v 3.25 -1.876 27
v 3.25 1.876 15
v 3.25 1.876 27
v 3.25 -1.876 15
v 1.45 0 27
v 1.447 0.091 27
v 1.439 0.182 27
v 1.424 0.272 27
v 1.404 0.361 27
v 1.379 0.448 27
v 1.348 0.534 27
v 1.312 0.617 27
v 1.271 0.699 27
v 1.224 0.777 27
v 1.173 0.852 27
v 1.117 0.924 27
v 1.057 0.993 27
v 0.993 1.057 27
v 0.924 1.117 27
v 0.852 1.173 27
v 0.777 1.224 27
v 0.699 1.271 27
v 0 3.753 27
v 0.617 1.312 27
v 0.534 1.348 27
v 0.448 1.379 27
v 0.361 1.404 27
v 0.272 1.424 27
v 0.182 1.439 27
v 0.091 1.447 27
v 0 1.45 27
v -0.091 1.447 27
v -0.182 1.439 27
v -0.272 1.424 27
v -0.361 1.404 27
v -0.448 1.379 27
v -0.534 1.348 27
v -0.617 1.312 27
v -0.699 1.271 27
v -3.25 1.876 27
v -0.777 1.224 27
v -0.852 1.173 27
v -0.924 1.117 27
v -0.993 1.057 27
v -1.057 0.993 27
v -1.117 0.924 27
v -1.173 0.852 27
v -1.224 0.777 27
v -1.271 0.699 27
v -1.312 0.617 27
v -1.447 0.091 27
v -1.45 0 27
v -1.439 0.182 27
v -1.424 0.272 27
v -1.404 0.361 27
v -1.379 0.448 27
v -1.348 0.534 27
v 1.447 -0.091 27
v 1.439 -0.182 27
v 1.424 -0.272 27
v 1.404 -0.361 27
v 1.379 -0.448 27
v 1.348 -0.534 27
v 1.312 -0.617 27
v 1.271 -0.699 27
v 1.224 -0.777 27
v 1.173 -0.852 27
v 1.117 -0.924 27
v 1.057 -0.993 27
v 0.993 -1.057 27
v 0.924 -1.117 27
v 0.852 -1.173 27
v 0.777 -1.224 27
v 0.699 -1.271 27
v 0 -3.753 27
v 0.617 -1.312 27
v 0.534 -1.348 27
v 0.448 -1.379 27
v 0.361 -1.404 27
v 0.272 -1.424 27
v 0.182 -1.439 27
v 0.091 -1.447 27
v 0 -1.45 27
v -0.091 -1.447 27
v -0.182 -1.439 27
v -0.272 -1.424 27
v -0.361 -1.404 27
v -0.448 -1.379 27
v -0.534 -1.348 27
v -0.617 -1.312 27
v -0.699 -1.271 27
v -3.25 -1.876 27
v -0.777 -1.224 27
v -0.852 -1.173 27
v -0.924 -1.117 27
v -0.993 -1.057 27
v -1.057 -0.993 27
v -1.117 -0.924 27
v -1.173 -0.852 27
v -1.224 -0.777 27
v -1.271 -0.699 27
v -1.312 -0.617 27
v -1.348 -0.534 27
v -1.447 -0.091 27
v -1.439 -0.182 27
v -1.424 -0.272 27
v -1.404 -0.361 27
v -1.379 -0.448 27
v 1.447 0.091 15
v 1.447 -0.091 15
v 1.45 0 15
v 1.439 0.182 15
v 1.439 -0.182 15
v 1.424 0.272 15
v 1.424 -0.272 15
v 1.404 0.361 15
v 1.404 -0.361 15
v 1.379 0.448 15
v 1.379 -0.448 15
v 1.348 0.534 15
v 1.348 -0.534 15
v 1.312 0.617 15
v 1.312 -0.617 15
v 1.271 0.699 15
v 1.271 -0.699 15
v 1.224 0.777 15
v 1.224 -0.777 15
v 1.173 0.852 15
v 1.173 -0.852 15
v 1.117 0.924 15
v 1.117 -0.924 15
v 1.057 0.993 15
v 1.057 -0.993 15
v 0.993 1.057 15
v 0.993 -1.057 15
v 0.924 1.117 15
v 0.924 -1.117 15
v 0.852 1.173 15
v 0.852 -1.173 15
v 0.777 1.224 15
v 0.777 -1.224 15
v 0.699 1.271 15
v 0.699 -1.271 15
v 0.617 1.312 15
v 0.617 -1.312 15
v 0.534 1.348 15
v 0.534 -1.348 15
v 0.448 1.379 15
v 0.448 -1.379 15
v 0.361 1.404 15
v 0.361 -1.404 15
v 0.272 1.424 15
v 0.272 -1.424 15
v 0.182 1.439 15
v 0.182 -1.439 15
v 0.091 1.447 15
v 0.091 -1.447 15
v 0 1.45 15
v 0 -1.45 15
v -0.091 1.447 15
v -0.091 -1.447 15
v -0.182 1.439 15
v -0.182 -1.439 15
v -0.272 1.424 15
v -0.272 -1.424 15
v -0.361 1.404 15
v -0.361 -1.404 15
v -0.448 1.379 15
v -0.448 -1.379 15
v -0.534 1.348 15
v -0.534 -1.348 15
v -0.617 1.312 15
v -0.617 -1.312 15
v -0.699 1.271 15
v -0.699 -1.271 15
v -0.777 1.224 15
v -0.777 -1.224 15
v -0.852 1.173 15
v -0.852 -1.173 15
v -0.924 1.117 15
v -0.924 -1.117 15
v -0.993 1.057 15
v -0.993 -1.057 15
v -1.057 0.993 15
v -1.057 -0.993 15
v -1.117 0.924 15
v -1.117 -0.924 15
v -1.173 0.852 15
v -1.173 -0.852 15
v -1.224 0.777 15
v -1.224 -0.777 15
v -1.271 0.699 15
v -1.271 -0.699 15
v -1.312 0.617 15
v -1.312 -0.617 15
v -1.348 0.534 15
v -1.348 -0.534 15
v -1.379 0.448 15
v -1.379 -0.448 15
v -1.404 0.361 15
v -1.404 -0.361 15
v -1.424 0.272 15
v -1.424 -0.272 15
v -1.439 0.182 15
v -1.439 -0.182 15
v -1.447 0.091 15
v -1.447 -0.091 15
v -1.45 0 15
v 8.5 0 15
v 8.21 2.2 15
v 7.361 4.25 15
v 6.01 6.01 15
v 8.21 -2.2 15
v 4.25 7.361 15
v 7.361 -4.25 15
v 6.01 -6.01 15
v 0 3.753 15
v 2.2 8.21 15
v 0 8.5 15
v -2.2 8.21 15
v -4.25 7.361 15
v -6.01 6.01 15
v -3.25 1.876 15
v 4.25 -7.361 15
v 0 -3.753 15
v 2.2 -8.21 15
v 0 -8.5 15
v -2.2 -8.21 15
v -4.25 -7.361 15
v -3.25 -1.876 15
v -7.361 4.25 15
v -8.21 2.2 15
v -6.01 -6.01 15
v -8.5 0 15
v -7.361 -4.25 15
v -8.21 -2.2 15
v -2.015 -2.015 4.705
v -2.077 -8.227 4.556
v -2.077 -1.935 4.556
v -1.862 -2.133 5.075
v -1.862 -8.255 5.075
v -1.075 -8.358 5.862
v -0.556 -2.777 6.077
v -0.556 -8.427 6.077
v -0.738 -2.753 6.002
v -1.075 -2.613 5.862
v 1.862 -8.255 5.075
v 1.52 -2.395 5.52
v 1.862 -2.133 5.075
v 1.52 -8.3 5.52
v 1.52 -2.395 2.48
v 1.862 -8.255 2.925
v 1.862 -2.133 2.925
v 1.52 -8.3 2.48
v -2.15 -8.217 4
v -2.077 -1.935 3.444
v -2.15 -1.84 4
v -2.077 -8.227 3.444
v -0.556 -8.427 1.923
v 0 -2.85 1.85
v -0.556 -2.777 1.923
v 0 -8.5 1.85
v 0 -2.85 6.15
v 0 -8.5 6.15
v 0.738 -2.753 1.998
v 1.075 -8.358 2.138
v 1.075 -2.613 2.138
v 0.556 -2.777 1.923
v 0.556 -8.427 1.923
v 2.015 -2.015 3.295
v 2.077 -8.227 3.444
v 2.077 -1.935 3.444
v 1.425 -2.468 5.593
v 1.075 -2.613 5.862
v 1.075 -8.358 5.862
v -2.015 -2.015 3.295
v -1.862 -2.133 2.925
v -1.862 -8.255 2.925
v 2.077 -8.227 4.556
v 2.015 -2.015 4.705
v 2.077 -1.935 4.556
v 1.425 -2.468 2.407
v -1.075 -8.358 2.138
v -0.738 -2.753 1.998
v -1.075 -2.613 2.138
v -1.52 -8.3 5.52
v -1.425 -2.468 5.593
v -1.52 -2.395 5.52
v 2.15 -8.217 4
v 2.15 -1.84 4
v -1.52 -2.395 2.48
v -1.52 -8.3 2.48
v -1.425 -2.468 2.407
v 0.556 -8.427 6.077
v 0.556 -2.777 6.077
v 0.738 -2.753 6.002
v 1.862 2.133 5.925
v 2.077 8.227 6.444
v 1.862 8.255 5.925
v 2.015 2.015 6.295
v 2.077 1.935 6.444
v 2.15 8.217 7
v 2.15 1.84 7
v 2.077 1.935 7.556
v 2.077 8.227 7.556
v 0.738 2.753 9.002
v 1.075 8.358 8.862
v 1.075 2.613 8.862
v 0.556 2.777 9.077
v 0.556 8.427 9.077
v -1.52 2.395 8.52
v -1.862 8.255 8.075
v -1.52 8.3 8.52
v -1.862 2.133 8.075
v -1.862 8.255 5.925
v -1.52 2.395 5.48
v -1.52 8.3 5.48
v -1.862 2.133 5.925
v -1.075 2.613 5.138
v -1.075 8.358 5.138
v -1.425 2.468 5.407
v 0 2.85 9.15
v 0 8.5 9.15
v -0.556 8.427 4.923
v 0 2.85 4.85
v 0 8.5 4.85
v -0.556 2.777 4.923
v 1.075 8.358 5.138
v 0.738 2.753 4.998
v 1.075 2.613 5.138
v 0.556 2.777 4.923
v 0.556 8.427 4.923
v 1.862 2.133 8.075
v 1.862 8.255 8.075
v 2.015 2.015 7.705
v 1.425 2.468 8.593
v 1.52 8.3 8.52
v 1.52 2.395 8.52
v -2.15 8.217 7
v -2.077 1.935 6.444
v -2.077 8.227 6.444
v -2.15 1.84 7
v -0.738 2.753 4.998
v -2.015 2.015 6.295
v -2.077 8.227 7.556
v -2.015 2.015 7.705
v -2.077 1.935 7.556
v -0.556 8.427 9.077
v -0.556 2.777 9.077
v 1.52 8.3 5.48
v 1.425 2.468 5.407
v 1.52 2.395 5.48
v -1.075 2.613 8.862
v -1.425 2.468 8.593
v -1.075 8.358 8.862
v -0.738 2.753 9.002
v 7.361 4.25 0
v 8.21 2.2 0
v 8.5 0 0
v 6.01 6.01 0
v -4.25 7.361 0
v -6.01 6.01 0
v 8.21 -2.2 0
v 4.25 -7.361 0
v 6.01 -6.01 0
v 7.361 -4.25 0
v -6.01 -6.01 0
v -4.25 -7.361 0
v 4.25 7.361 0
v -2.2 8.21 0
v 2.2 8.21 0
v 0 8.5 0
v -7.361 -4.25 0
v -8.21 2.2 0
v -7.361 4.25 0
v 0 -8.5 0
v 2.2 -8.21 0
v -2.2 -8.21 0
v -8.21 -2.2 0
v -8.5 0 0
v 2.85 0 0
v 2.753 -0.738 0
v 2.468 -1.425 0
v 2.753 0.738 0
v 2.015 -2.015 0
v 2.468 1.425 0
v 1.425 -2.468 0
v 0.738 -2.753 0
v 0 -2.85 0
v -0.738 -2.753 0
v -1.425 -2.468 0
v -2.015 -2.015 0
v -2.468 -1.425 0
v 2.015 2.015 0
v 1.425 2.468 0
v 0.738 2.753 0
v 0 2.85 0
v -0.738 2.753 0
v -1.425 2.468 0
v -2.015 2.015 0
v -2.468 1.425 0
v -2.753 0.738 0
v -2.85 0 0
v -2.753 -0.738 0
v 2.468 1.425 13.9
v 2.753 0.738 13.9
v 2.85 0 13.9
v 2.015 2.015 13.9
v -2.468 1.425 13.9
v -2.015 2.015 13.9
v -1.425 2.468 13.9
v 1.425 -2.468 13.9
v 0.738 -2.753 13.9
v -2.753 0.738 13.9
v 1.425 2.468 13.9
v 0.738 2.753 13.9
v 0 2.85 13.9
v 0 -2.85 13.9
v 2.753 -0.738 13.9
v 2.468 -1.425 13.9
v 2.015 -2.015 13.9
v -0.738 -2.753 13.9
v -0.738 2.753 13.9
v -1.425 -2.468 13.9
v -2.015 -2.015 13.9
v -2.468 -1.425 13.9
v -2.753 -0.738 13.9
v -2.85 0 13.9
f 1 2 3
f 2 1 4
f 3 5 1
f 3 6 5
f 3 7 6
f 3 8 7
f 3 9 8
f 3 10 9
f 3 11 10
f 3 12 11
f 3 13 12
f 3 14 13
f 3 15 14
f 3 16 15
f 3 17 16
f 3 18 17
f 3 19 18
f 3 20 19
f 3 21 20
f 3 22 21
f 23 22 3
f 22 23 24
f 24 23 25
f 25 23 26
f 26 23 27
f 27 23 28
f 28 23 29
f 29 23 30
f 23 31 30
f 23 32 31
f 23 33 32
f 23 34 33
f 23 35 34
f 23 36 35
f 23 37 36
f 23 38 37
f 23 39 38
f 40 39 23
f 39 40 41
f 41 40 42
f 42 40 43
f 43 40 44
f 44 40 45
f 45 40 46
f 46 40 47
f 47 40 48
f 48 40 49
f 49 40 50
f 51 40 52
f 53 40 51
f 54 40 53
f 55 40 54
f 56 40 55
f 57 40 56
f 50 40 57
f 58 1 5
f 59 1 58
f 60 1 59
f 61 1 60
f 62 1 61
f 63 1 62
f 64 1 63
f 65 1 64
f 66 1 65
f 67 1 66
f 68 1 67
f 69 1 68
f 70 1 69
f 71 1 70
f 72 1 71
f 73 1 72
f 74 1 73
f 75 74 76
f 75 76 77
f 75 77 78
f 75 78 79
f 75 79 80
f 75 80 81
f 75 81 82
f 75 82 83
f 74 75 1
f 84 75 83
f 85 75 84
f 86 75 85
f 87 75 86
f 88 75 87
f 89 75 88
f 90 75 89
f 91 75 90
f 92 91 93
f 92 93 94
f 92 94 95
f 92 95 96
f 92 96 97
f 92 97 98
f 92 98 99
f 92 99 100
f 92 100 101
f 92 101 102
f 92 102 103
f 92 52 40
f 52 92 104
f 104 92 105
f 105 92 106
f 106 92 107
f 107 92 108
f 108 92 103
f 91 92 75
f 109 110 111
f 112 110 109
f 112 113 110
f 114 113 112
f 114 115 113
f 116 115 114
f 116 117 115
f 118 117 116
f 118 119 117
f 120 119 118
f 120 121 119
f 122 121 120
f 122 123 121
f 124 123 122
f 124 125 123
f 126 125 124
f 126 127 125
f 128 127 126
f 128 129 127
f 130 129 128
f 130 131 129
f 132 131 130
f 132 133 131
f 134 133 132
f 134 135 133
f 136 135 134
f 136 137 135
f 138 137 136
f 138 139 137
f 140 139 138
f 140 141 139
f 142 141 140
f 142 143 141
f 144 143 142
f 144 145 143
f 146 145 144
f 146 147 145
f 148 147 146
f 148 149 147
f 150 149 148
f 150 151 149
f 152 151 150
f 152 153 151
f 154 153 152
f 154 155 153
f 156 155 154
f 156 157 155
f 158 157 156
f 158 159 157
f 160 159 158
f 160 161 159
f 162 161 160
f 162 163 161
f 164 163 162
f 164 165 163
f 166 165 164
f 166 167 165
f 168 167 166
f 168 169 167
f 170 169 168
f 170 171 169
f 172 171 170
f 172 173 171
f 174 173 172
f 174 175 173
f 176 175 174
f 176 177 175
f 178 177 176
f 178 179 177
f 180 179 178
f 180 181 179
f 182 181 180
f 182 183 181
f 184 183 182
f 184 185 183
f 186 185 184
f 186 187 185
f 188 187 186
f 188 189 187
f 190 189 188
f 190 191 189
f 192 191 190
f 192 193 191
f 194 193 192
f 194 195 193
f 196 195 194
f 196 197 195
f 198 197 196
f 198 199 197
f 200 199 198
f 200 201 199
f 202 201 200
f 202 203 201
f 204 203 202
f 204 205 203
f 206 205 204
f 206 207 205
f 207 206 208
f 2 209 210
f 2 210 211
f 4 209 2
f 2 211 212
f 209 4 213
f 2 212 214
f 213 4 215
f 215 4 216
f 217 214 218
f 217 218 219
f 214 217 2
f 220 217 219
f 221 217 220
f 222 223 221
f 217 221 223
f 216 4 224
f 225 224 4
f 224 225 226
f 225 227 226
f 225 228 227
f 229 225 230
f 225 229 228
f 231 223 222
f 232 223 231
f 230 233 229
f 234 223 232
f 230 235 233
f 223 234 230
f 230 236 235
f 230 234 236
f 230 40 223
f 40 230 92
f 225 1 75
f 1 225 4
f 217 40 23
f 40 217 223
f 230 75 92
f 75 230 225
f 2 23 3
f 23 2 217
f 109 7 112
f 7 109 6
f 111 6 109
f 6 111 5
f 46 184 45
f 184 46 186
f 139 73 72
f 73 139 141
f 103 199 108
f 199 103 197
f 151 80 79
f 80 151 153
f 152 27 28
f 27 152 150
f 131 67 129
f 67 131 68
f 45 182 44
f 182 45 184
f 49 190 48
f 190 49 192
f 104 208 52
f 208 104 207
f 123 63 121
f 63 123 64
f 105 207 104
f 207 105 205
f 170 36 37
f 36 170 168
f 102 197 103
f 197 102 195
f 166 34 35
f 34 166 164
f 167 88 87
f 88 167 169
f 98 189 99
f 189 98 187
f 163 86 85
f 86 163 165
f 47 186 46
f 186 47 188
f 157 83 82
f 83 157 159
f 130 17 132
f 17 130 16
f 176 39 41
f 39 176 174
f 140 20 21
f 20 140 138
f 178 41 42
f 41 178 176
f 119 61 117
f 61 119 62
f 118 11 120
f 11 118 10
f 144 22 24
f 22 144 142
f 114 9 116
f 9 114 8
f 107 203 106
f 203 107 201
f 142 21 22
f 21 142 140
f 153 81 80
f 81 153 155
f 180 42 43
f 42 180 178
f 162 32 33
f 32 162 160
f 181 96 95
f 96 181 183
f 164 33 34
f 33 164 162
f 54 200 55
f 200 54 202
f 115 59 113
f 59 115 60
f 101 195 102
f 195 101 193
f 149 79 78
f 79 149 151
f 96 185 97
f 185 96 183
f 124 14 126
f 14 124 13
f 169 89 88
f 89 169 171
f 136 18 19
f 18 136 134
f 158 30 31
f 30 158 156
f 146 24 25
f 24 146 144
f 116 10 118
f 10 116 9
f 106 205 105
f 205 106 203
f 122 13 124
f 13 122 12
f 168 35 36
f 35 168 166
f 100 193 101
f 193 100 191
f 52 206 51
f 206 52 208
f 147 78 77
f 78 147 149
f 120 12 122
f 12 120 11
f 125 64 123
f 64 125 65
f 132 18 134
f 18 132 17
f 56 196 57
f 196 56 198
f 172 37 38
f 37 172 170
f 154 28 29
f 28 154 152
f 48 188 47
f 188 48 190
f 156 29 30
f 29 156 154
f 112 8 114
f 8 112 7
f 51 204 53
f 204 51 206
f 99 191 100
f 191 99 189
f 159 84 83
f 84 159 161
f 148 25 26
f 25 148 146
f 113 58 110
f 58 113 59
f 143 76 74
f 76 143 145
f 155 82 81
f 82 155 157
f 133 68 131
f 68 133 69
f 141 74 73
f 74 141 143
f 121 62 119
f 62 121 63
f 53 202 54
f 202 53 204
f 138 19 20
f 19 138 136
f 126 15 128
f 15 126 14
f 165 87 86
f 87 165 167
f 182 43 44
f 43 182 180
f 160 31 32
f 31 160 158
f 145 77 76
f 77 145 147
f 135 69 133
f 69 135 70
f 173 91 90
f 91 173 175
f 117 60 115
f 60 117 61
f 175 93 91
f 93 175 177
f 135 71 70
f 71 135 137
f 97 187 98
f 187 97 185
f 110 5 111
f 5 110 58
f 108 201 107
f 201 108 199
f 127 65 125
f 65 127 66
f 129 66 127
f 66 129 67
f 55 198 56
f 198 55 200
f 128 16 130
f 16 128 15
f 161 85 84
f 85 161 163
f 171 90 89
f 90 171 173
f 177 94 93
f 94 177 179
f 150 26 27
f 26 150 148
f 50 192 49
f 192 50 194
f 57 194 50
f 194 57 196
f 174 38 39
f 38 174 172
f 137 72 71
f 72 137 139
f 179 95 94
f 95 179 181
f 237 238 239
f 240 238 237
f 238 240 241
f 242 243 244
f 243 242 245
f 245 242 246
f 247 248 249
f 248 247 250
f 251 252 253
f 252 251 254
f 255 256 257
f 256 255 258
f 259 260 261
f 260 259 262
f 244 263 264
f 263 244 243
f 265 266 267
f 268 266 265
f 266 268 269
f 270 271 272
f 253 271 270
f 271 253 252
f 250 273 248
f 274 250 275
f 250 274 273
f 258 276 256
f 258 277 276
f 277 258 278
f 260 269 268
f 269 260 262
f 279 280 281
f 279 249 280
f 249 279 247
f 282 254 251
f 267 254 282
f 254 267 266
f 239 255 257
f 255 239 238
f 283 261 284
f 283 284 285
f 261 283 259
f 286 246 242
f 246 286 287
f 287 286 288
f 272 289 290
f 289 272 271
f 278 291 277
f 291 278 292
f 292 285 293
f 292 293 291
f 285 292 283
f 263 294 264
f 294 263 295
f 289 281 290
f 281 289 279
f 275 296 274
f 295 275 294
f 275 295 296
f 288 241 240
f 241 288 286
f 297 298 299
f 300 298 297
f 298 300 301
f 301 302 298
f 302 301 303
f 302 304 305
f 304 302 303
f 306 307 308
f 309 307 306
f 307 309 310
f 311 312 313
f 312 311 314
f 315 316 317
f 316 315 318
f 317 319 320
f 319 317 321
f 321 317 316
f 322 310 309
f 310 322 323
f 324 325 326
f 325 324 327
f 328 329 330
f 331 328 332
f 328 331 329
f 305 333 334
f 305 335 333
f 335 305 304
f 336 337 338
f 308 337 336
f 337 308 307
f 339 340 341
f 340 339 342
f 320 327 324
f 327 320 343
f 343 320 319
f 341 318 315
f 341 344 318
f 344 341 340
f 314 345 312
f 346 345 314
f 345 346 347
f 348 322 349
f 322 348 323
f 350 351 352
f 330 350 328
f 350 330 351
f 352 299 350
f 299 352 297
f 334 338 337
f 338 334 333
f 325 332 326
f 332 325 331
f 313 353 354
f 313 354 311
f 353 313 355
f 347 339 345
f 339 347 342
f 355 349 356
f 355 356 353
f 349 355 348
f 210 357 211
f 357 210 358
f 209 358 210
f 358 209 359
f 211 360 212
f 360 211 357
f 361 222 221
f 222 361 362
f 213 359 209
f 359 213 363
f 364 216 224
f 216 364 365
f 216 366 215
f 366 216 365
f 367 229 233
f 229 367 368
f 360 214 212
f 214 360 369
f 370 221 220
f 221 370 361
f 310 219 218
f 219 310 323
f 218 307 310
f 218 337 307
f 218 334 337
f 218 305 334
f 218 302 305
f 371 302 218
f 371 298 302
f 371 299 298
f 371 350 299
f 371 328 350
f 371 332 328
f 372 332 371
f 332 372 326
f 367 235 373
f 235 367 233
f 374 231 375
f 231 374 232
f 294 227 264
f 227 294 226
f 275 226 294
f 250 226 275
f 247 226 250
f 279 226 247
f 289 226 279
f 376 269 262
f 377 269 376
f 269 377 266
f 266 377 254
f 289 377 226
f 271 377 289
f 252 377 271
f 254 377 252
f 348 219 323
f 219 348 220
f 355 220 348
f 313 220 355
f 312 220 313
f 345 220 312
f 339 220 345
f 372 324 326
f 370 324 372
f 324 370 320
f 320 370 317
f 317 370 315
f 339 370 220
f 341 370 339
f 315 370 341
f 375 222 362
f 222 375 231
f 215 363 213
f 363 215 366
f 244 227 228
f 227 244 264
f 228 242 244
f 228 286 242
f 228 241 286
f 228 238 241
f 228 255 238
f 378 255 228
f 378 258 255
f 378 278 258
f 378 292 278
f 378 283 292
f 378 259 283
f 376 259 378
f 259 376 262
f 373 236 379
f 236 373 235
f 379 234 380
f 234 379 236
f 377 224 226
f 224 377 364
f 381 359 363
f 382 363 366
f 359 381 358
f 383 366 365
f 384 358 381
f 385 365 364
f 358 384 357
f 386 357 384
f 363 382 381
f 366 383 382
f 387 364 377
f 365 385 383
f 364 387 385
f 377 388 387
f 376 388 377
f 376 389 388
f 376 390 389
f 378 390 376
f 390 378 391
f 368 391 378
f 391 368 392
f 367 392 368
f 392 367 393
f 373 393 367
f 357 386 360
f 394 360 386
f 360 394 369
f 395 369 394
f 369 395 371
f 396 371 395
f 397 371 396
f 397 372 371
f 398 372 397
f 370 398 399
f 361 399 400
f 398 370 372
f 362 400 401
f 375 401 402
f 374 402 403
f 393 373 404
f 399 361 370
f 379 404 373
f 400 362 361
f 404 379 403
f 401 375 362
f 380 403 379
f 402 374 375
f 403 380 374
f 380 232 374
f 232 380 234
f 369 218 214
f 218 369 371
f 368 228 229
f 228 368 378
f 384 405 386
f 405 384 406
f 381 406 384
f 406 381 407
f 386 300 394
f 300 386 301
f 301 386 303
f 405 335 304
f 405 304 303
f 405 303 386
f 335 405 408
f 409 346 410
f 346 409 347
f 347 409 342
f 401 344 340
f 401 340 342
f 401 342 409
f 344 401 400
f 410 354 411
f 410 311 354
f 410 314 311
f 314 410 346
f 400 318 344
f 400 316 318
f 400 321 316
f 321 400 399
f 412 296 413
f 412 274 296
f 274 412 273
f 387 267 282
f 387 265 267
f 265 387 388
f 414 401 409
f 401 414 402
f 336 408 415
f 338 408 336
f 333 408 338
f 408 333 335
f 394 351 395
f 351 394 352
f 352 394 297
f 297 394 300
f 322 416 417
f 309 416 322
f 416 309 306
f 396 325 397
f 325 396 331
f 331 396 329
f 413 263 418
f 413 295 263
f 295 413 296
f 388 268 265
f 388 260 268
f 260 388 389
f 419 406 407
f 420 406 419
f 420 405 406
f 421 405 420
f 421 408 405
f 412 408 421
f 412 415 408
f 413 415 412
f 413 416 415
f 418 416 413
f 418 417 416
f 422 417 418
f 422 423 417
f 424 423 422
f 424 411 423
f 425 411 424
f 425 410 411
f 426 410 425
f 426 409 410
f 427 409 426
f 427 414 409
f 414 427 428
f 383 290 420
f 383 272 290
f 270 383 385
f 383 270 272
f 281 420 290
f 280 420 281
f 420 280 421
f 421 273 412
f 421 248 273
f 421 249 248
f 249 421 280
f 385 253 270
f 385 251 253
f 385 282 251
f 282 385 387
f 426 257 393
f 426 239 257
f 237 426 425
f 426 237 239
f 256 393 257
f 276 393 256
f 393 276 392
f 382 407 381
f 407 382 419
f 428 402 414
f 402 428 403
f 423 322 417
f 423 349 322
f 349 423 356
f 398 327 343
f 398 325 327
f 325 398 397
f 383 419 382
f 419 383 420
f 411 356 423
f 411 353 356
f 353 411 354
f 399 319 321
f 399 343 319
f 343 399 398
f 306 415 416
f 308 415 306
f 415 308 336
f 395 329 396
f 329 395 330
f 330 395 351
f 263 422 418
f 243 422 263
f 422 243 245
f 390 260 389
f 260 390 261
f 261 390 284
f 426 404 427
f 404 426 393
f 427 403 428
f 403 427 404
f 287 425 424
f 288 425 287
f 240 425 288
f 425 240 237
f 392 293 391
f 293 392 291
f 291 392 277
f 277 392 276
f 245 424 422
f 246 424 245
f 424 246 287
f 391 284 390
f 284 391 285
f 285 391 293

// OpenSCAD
/*
 * Module: project_12mm_hex_wheel_adaptors.scad
 * this generates an adaptor the connects standard RC wheel 12mm hex nut
 *   wheels to standard robotics motor hubs  
 *
 *   NOTE that hub adaptors should be printed slowly -- about 50% normal print speed 
 *
 * Author(s): Don Korte 
 *
 * github: https://github.com/dnkorte/
 *  
 * MIT License
 * 
 * Copyright (c) 2022 Don Korte
 * 
 * Permission is hereby granted, free of charge, to any person obtaining a copy
 * of this software and associated documentation files (the "Software"), to deal
 * in the Software without restriction, including without limitation the rights
 * to use, copy, modify, merge, publish, distribute, sublicense, and/or sell
 * copies of the Software, and to permit persons to whom the Software is
 * furnished to do so, subject to the following conditions:
 * 
 * The above copyright notice and this permission notice shall be included in all
 * copies or substantial portions of the Software.
 * 
 * THE SOFTWARE IS PROVIDED "AS IS", WITHOUT WARRANTY OF ANY KIND, EXPRESS OR
 * IMPLIED, INCLUDING BUT NOT LIMITED TO THE WARRANTIES OF MERCHANTABILITY,
 * FITNESS FOR A PARTICULAR PURPOSE AND NONINFRINGEMENT. IN NO EVENT SHALL THE
 * AUTHORS OR COPYRIGHT HOLDERS BE LIABLE FOR ANY CLAIM, DAMAGES OR OTHER
 * LIABILITY, WHETHER IN AN ACTION OF CONTRACT, TORT OR OTHERWISE, ARISING FROM,
 * OUT OF OR IN CONNECTION WITH THE SOFTWARE OR THE USE OR OTHER DEALINGS IN THE
 * SOFTWARE.
 */


/* [What PART do you want to model?] */
part = "80mm_DFR_wheel_5";  // [ "80mm_DFR_wheel_6", "80mm_DFR_wheel_5", "80mm_DFR_wheel_4", "48mm_DFR_wheel (NOT)", "test" ]

shaft = 4; // [ 6:6mm, 5:5mm, 4:4mm ]

// length of "round" part of adaptor that surrounds axle
hub_len = 15;   // [12, 15, 18, 20 ]

/* [Grub Screw Details] */
// distance of "first" grub screw from motor end of adaptor
grubscrew_dist_from_end = 4;    // [ 3, 4, 5, 6 ]
// distance between grub screws
grubscrew_separation = 3;       // [ 2, 3, 4, 5, 6, 7, 8 ] 
// grubscrew type
grubscrew_type = 3;  // [ 1:"M3 selftap", 2:"M2.5 selftap", 3:"M3 insert", 4:"M2.5 insert" ]
// wall thickness where screws are (for self-tap or TI)
screw_area_thickness = 6;       // [ 3, 4, 5, 6, 7 ]




draw_part();

module draw_part() {
    $fn = 24;

    if (part == "80mm_DFR_wheel_6") {
        //draw_80mm_dfr_adaptor();
        draw_80mm_dfr_adaptor_A(6);
    }
    if (part == "80mm_DFR_wheel_5") {
        //draw_80mm_dfr_adaptor();
        draw_80mm_dfr_adaptor_A(5);
    }
    if (part == "80mm_DFR_wheel_4") {
        //draw_80mm_dfr_adaptor();
        draw_80mm_dfr_adaptor_A(4);
    }
    if (part == "48mm_adaptor") {
        //draw_48mm_dfr_adaptor();
    }
    if (part == "test") {
        draw_80mm_dfr_adaptor_A();
    }
}
/*
 * hub adaptor parameters that are not displayed in OpenScad Customizer
 */

// standard parameters for all parts
screwhole_radius_M30_passthru = 2;  
screwhole_radius_M30_selftap = 1.45;
screwhole_radius_M25_passthru = 1.8;  
screwhole_radius_M25_selftap = 1.25; 
TI30_through_hole_diameter = 4.3; 
TI25_through_hole_diameter = 4.1;  
axle_clearance_gap = 0.7;   // allowance for 3d printer "slop" + slide fit


// parameters for the motor insert "nut"
screwhole_dia_wheel_attachment_screw = (screwhole_radius_M30_selftap * 2);

width_across_flats_80mm_dfr = 6.5;
nut_length_80mm_dfr = 12;
max_apron_dia_80mm = 25;
width_across_flats_48mm_dfr = 6.0;
nut_length_48mm_dfr = 12;
max_apron_dia_48mm = 22;
TT_shaft_dia = 5.3 + axle_clearance_gap;
TT_shaft_flatwidth = 3.8 + axle_clearance_gap;


module draw_80mm_dfr_adaptor_A(motor_shaft_dia = 4) {
    hub_dia_fat = motor_shaft_dia + 2*(screw_area_thickness);   // dia at motor end

    g1 = grubscrew_dist_from_end;
    g2 = grubscrew_dist_from_end + grubscrew_separation;


    translate([ 0, 0, hub_len ]) make_hex_nut(width_across_flats_80mm_dfr, nut_length_80mm_dfr, screwhole_dia_wheel_attachment_screw);
    

    difference() {  
        cylinder(d=(hub_dia_fat), h=hub_len);
        translate([ 0, 0, -0.1 ]) cylinder(d=motor_shaft_dia + axle_clearance_gap, h=hub_len - 1);

        if (grubscrew_type == 1) {
            // M3 selftap
            translate([ 0, 0, g1 ]) rotate([  -90, 0, 180  ])  
                cylinder( r=screwhole_radius_M30_selftap, h=hub_dia_fat);
            translate([ 0, 0, g2 ]) rotate([  -90, 0, 0  ])  
                cylinder( r=screwhole_radius_M30_selftap, h=hub_dia_fat);

        } else if (grubscrew_type == 2) {
            // M2.5 selftap
            translate([ 0, 0, g1 ]) rotate([  -90, 0, 180  ])  
                cylinder( r=screwhole_radius_M25_selftap, h=hub_dia_fat);
            translate([ 0, 0, g2 ]) rotate([  -90, 0, 0  ])  
                cylinder( r=screwhole_radius_M25_selftap, h=hub_dia_fat);

        } else if (grubscrew_type == 3) {
            // M3 threaded insert
            translate([ 0, 0, g1 ]) rotate([  -90, 0, 180  ])  
                cylinder( d=TI30_through_hole_diameter, h=hub_dia_fat);
            translate([ 0, 0, g2 ]) rotate([  -90, 0, 0  ])  
                cylinder( d=TI30_through_hole_diameter, h=hub_dia_fat);
        
        } else if (grubscrew_type == 4) {
            // M2.5 threaded insert
            translate([ 0, 0, g1 ]) rotate([  -90, 0, 180  ])  
                cylinder( d=TI25_through_hole_diameter, h=hub_dia_fat);
            translate([ 0, 0, g2 ]) rotate([  -90, 0, 0  ])  
                cylinder( d=TI25_through_hole_diameter, h=hub_dia_fat);
        
        }
    } 
}


module draw_80mm_dfr_adaptor() {
    hub_dia = 12;

    g1 = hub_len - grubscrew_dist_from_end;
    g2 = hub_len - grubscrew_dist_from_end - grubscrew_separation;
    apron_dia = min((2*(g2+3)), max_apron_dia_80mm);

    translate([ 0, 0, hub_len + nut_length_80mm_dfr ]) rotate([ 180, 0, 0 ]) union() {
        make_hex_nut(width_across_flats_80mm_dfr, nut_length_80mm_dfr, screwhole_dia_wheel_attachment_screw);
    
        // translate and rotate this part because i generated it assuming nut is down
        // but it should be printed with nut up...

        translate([ 0, 0, nut_length_80mm_dfr ]) difference() {
            union() {
                cylinder(d=hub_dia, h=hub_len);
                translate([ 0, -(hub_dia+3)/2, g1 ]) rotate([  -90, 0, 0  ])  cylinder( d=5, h=hub_dia+3);
                translate([ 0, -(hub_dia+3)/2, g2 ]) rotate([  -90, 0, 0  ])  cylinder( d=5, h=hub_dia+3);
                //cylinder (d1=apron_dia, d2=6, h=g2);
            }

            if (shaft == 0) {
                // this is a TT shaft
                translate([ 0, 0, -0.1 ]) shaft_flat(TT_shaft_dia, TT_shaft_flatwidth, hub_len + 0.2, orientation="wide");
            } else {
                // this is a round shaft with specified diameter
                translate([ 0, 0, -0.1 ]) cylinder(d=shaft, h=hub_len + 0.2);
            }


            translate([ 0, -((hub_dia+3)/2)-0.1, g1 ]) rotate([  -90, 0, 0  ])  cylinder( r= screwhole_radius_M30_selftap, h=hub_dia+3.2);
            translate([ 0, -((hub_dia+3)/2)-0.1, g2 ]) rotate([  -90, 0, 0  ])  cylinder( r= screwhole_radius_M30_selftap, h=hub_dia+3.2);
        } 
    }
}

module test() {
    difference() {
        roundedbox(50, 40, 3, 4);
        //translate([ 21, 16, -0.1 ]) cylinder( d=3.5, h=4.2);
        translate([ 16, 16, -0.1 ]) cylinder( d=3.5, h=4.2);
        translate([ 16, 0, -0.1 ]) cylinder( d=3.5, h=4.2);
        translate([ 16, -16, -0.1 ]) cylinder( d=3.5, h=4.2);

        translate([ 0, 16, -0.1 ]) cylinder( d=3.5, h=4.2);
        translate([ 0, 0, -0.1 ]) cylinder( d=3.5, h=4.2);
        translate([ 0, -16, -0.1 ]) cylinder( d=3.5, h=4.2);

        translate([ -16, 16, -0.1 ]) cylinder( d=3.5, h=4.2);
        translate([ -16, 0, -0.1 ]) cylinder( d=3.5, h=4.2);
        translate([ -16, -16, -0.1 ]) cylinder( d=3.5, h=4.2);
    }
}

module nut_tester() {
    cube([ 15, 15, 2 ], center=true);
    make_hex_nut(6.6, 15, screwhole_dia_wheel_attachment_screw);
}



/*
 * module prism generates a basic "wedge" shape that can be used vertically to make support-less
 * 3d-printable shelves; this is defined in openSCAD documetation at:
 *      https://en.wikibooks.org/wiki/OpenSCAD_User_Manual/Primitive_Solids
 */

module prism(l, w, h){
   polyhedron(
           points=[[0,0,0], [l,0,0], [l,w,0], [0,w,0], [0,w,h], [l,w,h]],
           faces=[[0,1,2,3],[5,4,3,2],[0,4,5,1],[0,3,4],[5,2,1]]
           );
}

/*
 * ***************************************************************************
 * module shaft_flat() makes a flattened shaft
 * this is a round cylinder, with flats on 2 sides (ie for a TT motor)
 *  
 * this is generated in xy plane, centered at origin, pointed "up" (towards + Z)
 * it should be "added" to design, there are no holes needed at placement level
 *
 * for TT motor, assume actual 5.3 diameter, with flatwidth 3.8mm;  but leave clearance gap too
 *
 * parameters:
 *      diameter    diameter of round part of shaft, in mm
 *      flatwidth   dimension across flat part in mm (flat-to-flat)
 *      length      length (or height) of shaft
 *      orientation "tall" or "wide" 
 *          (for tall, initial flats are on left/right (+/- x sides))
 * ***************************************************************************
 */
module shaft_flat(diameter, flatwidth, length, orientation="tall") {
    remove_from_each_side = (diameter - flatwidth) / 2;

    if (orientation == "tall") {
        difference() {
            cylinder(r=(diameter/2), h=length);
            translate([ -(diameter/2), -(diameter/2), -0.1 ]) 
                cube([ remove_from_each_side, diameter, length+0.2 ]);
            translate([ (diameter/2)-remove_from_each_side, -(diameter/2), -0.1 ]) 
                cube([ remove_from_each_side, diameter, length+0.2 ]);
        }
    } else {
        rotate([ 0, 0, -90 ]) difference() {
            cylinder(r=(diameter/2), h=length);
            translate([ -(diameter/2), -(diameter/2), -0.1 ]) 
                cube([ remove_from_each_side, diameter, length+0.2 ]);
            translate([ (diameter/2)-remove_from_each_side, -(diameter/2), -0.1 ]) 
                cube([ remove_from_each_side, diameter, length+0.2 ]);
        }
    }
}

/*
 * hex nut generator, from
 * https://github.com/chrisspen/openscad-extra
 */


module make_hex_nut(w, h, d=0){
    // d = inner diameter
    // w = width across the flats
    // h = height or thickness
    s = w/sqrt(3);
    $fn = 100;
    
    translate([ 0, 0, h/2 ]) difference(){
        union(){
            for(i=[0:1:2]){
                rotate([0,0,120*i])
                cube([w, s, h], center=true);
            }
        }
        if(d){
            cylinder(d=d, h=h+1, center=true);
        }
    }
}

/*
 * this generates a box with rounded corners
 * the box is centered on the origin, running "up" from z=0
 * reference: https://hackaday.com/2018/02/13/openscad-tieing-it-together-with-hull/
 */
module roundedbox(x, y, radius=3, height=3) {
    left_x = -(x/2) + radius;
    right_x = (x/2) - radius;
    bottom_y = -(y/2) + radius;
    top_y = +(y/2) - radius;
    
    points = [ [left_x, bottom_y,0], [left_x, top_y,0], [right_x, top_y,0], [right_x, bottom_y,0] ]; 
    hull() {
        for (p=points) {
            translate(p) cylinder(r=radius, h=height);
        }
    }
}
